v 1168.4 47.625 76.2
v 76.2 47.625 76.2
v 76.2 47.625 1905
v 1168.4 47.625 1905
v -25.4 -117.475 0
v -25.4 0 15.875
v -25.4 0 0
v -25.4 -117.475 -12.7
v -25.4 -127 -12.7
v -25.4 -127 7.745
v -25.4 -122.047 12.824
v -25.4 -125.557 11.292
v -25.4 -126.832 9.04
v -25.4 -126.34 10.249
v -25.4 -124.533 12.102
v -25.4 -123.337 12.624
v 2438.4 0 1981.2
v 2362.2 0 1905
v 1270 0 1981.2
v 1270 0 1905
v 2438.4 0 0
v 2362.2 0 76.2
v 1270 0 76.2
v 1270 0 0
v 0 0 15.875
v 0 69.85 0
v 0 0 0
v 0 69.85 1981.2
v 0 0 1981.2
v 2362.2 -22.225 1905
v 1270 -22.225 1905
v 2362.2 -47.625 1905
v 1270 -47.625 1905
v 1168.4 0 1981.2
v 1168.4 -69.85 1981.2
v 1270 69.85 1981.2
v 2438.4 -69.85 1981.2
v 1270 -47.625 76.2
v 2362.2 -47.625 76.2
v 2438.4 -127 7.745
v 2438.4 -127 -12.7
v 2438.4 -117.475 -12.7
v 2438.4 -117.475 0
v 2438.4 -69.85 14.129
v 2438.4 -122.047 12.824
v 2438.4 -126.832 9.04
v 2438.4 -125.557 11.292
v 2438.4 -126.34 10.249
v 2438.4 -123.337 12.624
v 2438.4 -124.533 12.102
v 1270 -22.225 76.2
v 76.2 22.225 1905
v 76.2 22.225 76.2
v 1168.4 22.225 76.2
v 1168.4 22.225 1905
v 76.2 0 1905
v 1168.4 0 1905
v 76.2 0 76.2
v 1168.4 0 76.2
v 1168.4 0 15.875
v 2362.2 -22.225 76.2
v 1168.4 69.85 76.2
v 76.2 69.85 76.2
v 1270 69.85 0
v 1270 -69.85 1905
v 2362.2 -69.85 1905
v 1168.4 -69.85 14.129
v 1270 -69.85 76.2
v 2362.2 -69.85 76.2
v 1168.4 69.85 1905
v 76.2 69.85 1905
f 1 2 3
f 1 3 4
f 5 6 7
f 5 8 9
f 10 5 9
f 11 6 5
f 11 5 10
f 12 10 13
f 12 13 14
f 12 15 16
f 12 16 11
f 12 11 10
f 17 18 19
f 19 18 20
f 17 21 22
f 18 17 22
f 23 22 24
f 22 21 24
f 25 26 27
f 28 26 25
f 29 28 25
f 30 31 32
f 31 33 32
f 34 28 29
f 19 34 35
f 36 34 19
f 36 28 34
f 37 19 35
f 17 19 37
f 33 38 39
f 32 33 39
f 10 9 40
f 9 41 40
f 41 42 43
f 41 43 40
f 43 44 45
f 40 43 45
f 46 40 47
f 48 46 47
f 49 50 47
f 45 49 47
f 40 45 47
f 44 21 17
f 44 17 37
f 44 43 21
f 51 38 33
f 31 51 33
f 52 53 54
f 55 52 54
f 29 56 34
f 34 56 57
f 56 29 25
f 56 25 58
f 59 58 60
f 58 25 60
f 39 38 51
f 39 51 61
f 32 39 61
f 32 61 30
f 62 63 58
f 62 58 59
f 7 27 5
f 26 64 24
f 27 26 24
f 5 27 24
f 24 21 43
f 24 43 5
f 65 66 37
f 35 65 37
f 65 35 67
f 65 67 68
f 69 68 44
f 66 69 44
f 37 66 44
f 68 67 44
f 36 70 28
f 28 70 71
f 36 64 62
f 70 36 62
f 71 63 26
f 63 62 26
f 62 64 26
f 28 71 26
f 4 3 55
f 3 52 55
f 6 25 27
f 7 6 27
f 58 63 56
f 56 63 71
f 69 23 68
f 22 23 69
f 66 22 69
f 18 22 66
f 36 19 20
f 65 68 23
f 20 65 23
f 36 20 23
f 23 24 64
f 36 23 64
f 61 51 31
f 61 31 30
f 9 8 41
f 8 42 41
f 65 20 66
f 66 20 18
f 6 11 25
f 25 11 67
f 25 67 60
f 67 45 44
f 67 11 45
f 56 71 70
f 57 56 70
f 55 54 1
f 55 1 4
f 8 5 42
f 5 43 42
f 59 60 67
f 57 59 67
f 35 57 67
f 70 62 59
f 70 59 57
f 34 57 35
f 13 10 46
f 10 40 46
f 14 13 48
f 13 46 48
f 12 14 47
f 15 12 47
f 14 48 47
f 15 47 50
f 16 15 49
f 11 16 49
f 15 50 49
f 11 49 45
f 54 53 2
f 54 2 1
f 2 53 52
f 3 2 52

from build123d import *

# Parameters (mm, degrees)
F1_DEPTH       = 1981.2
F2_W           = 1092.2
F2_H           = 1828.8
F3_DEPTH       = 76.2
F3_DEPTH_BACK  = 76.2
F6_W           = 1092.2
F6_H           = 1828.8
F7_DEPTH       = 12.7
F9_W           = 1092.2
F9_H           = 1828.8
F10_DEPTH      = 12.7
F12_DEPTH      = 2438.4
F12_DEPTH_BACK = 25.4
F13_R          = 5.08


with BuildPart() as f1:
    # F0 (on Top) → F1 (new body)
    with BuildSketch(Plane.XY):
        Polygon((0, 69.85), (0, 0), (1168.4, 0), (1168.4, -69.85), (2438.4, -69.85), (2438.4, 0), (1270, 0), (1270, 69.85), align=None)
    extrude(amount=F1_DEPTH)


with BuildPart() as f3:
    # F2 (on face) → F3 (new body, two sides)
    with BuildSketch(Plane.XZ) as f3_sk:
        with Locations((622.3, 990.6)):
            Rectangle(F2_W, F2_H)
    extrude(amount=-F3_DEPTH)
    extrude(f3_sk.sketch, amount=F3_DEPTH_BACK)


with BuildPart() as f3b:
    # F2 (on face) → F3, piece 2 (new body, two sides)
    with BuildSketch(Plane.XZ) as f3_2_sk:
        with Locations((1816.1, 990.6)):
            Rectangle(F2_W, F2_H)
    extrude(amount=-F3_DEPTH)
    extrude(f3_2_sk.sketch, amount=F3_DEPTH_BACK)


with BuildPart() as f1_1:
    add(f1.part)

    # F4: cut F3, F3b
    add(f3.part, mode=Mode.SUBTRACT)
    add(f3b.part, mode=Mode.SUBTRACT)

    # F11 (on face) → F12 (join, two sides)
    with BuildSketch(Plane(origin=(0, 0, 0), x_dir=(0, -1, 0), z_dir=(-1, 0, 0))) as f12_sk:
        Polygon((0, 15.875), (0, 0), (117.475, 0), (117.475, -12.7), (127, -12.7), (127, 12.7), align=None)
    extrude(amount=-F12_DEPTH)
    extrude(f12_sk.sketch, amount=F12_DEPTH_BACK)

    # F13
    f13_edges = [f1_1.edges().sort_by_distance(p)[0] for p in [
        (1206.5, -127, 12.7),
    ]]
    fillet(f13_edges, radius=F13_R)


with BuildPart() as f7:
    # F6 (on offset) → F7 (new body, symmetric)
    with BuildSketch(Plane.XZ.offset(-34.925)):
        with Locations((622.3, 990.6)):
            Rectangle(F6_W, F6_H)
    extrude(amount=F7_DEPTH, both=True)


with BuildPart() as f10:
    # F9 (on offset) → F10 (new body, symmetric)
    with BuildSketch(Plane.XZ.offset(34.925)):
        with Locations((1816.1, 990.6)):
            Rectangle(F9_W, F9_H)
    extrude(amount=F10_DEPTH, both=True)


solid = Compound([f1_1.part, f7.part, f10.part])
